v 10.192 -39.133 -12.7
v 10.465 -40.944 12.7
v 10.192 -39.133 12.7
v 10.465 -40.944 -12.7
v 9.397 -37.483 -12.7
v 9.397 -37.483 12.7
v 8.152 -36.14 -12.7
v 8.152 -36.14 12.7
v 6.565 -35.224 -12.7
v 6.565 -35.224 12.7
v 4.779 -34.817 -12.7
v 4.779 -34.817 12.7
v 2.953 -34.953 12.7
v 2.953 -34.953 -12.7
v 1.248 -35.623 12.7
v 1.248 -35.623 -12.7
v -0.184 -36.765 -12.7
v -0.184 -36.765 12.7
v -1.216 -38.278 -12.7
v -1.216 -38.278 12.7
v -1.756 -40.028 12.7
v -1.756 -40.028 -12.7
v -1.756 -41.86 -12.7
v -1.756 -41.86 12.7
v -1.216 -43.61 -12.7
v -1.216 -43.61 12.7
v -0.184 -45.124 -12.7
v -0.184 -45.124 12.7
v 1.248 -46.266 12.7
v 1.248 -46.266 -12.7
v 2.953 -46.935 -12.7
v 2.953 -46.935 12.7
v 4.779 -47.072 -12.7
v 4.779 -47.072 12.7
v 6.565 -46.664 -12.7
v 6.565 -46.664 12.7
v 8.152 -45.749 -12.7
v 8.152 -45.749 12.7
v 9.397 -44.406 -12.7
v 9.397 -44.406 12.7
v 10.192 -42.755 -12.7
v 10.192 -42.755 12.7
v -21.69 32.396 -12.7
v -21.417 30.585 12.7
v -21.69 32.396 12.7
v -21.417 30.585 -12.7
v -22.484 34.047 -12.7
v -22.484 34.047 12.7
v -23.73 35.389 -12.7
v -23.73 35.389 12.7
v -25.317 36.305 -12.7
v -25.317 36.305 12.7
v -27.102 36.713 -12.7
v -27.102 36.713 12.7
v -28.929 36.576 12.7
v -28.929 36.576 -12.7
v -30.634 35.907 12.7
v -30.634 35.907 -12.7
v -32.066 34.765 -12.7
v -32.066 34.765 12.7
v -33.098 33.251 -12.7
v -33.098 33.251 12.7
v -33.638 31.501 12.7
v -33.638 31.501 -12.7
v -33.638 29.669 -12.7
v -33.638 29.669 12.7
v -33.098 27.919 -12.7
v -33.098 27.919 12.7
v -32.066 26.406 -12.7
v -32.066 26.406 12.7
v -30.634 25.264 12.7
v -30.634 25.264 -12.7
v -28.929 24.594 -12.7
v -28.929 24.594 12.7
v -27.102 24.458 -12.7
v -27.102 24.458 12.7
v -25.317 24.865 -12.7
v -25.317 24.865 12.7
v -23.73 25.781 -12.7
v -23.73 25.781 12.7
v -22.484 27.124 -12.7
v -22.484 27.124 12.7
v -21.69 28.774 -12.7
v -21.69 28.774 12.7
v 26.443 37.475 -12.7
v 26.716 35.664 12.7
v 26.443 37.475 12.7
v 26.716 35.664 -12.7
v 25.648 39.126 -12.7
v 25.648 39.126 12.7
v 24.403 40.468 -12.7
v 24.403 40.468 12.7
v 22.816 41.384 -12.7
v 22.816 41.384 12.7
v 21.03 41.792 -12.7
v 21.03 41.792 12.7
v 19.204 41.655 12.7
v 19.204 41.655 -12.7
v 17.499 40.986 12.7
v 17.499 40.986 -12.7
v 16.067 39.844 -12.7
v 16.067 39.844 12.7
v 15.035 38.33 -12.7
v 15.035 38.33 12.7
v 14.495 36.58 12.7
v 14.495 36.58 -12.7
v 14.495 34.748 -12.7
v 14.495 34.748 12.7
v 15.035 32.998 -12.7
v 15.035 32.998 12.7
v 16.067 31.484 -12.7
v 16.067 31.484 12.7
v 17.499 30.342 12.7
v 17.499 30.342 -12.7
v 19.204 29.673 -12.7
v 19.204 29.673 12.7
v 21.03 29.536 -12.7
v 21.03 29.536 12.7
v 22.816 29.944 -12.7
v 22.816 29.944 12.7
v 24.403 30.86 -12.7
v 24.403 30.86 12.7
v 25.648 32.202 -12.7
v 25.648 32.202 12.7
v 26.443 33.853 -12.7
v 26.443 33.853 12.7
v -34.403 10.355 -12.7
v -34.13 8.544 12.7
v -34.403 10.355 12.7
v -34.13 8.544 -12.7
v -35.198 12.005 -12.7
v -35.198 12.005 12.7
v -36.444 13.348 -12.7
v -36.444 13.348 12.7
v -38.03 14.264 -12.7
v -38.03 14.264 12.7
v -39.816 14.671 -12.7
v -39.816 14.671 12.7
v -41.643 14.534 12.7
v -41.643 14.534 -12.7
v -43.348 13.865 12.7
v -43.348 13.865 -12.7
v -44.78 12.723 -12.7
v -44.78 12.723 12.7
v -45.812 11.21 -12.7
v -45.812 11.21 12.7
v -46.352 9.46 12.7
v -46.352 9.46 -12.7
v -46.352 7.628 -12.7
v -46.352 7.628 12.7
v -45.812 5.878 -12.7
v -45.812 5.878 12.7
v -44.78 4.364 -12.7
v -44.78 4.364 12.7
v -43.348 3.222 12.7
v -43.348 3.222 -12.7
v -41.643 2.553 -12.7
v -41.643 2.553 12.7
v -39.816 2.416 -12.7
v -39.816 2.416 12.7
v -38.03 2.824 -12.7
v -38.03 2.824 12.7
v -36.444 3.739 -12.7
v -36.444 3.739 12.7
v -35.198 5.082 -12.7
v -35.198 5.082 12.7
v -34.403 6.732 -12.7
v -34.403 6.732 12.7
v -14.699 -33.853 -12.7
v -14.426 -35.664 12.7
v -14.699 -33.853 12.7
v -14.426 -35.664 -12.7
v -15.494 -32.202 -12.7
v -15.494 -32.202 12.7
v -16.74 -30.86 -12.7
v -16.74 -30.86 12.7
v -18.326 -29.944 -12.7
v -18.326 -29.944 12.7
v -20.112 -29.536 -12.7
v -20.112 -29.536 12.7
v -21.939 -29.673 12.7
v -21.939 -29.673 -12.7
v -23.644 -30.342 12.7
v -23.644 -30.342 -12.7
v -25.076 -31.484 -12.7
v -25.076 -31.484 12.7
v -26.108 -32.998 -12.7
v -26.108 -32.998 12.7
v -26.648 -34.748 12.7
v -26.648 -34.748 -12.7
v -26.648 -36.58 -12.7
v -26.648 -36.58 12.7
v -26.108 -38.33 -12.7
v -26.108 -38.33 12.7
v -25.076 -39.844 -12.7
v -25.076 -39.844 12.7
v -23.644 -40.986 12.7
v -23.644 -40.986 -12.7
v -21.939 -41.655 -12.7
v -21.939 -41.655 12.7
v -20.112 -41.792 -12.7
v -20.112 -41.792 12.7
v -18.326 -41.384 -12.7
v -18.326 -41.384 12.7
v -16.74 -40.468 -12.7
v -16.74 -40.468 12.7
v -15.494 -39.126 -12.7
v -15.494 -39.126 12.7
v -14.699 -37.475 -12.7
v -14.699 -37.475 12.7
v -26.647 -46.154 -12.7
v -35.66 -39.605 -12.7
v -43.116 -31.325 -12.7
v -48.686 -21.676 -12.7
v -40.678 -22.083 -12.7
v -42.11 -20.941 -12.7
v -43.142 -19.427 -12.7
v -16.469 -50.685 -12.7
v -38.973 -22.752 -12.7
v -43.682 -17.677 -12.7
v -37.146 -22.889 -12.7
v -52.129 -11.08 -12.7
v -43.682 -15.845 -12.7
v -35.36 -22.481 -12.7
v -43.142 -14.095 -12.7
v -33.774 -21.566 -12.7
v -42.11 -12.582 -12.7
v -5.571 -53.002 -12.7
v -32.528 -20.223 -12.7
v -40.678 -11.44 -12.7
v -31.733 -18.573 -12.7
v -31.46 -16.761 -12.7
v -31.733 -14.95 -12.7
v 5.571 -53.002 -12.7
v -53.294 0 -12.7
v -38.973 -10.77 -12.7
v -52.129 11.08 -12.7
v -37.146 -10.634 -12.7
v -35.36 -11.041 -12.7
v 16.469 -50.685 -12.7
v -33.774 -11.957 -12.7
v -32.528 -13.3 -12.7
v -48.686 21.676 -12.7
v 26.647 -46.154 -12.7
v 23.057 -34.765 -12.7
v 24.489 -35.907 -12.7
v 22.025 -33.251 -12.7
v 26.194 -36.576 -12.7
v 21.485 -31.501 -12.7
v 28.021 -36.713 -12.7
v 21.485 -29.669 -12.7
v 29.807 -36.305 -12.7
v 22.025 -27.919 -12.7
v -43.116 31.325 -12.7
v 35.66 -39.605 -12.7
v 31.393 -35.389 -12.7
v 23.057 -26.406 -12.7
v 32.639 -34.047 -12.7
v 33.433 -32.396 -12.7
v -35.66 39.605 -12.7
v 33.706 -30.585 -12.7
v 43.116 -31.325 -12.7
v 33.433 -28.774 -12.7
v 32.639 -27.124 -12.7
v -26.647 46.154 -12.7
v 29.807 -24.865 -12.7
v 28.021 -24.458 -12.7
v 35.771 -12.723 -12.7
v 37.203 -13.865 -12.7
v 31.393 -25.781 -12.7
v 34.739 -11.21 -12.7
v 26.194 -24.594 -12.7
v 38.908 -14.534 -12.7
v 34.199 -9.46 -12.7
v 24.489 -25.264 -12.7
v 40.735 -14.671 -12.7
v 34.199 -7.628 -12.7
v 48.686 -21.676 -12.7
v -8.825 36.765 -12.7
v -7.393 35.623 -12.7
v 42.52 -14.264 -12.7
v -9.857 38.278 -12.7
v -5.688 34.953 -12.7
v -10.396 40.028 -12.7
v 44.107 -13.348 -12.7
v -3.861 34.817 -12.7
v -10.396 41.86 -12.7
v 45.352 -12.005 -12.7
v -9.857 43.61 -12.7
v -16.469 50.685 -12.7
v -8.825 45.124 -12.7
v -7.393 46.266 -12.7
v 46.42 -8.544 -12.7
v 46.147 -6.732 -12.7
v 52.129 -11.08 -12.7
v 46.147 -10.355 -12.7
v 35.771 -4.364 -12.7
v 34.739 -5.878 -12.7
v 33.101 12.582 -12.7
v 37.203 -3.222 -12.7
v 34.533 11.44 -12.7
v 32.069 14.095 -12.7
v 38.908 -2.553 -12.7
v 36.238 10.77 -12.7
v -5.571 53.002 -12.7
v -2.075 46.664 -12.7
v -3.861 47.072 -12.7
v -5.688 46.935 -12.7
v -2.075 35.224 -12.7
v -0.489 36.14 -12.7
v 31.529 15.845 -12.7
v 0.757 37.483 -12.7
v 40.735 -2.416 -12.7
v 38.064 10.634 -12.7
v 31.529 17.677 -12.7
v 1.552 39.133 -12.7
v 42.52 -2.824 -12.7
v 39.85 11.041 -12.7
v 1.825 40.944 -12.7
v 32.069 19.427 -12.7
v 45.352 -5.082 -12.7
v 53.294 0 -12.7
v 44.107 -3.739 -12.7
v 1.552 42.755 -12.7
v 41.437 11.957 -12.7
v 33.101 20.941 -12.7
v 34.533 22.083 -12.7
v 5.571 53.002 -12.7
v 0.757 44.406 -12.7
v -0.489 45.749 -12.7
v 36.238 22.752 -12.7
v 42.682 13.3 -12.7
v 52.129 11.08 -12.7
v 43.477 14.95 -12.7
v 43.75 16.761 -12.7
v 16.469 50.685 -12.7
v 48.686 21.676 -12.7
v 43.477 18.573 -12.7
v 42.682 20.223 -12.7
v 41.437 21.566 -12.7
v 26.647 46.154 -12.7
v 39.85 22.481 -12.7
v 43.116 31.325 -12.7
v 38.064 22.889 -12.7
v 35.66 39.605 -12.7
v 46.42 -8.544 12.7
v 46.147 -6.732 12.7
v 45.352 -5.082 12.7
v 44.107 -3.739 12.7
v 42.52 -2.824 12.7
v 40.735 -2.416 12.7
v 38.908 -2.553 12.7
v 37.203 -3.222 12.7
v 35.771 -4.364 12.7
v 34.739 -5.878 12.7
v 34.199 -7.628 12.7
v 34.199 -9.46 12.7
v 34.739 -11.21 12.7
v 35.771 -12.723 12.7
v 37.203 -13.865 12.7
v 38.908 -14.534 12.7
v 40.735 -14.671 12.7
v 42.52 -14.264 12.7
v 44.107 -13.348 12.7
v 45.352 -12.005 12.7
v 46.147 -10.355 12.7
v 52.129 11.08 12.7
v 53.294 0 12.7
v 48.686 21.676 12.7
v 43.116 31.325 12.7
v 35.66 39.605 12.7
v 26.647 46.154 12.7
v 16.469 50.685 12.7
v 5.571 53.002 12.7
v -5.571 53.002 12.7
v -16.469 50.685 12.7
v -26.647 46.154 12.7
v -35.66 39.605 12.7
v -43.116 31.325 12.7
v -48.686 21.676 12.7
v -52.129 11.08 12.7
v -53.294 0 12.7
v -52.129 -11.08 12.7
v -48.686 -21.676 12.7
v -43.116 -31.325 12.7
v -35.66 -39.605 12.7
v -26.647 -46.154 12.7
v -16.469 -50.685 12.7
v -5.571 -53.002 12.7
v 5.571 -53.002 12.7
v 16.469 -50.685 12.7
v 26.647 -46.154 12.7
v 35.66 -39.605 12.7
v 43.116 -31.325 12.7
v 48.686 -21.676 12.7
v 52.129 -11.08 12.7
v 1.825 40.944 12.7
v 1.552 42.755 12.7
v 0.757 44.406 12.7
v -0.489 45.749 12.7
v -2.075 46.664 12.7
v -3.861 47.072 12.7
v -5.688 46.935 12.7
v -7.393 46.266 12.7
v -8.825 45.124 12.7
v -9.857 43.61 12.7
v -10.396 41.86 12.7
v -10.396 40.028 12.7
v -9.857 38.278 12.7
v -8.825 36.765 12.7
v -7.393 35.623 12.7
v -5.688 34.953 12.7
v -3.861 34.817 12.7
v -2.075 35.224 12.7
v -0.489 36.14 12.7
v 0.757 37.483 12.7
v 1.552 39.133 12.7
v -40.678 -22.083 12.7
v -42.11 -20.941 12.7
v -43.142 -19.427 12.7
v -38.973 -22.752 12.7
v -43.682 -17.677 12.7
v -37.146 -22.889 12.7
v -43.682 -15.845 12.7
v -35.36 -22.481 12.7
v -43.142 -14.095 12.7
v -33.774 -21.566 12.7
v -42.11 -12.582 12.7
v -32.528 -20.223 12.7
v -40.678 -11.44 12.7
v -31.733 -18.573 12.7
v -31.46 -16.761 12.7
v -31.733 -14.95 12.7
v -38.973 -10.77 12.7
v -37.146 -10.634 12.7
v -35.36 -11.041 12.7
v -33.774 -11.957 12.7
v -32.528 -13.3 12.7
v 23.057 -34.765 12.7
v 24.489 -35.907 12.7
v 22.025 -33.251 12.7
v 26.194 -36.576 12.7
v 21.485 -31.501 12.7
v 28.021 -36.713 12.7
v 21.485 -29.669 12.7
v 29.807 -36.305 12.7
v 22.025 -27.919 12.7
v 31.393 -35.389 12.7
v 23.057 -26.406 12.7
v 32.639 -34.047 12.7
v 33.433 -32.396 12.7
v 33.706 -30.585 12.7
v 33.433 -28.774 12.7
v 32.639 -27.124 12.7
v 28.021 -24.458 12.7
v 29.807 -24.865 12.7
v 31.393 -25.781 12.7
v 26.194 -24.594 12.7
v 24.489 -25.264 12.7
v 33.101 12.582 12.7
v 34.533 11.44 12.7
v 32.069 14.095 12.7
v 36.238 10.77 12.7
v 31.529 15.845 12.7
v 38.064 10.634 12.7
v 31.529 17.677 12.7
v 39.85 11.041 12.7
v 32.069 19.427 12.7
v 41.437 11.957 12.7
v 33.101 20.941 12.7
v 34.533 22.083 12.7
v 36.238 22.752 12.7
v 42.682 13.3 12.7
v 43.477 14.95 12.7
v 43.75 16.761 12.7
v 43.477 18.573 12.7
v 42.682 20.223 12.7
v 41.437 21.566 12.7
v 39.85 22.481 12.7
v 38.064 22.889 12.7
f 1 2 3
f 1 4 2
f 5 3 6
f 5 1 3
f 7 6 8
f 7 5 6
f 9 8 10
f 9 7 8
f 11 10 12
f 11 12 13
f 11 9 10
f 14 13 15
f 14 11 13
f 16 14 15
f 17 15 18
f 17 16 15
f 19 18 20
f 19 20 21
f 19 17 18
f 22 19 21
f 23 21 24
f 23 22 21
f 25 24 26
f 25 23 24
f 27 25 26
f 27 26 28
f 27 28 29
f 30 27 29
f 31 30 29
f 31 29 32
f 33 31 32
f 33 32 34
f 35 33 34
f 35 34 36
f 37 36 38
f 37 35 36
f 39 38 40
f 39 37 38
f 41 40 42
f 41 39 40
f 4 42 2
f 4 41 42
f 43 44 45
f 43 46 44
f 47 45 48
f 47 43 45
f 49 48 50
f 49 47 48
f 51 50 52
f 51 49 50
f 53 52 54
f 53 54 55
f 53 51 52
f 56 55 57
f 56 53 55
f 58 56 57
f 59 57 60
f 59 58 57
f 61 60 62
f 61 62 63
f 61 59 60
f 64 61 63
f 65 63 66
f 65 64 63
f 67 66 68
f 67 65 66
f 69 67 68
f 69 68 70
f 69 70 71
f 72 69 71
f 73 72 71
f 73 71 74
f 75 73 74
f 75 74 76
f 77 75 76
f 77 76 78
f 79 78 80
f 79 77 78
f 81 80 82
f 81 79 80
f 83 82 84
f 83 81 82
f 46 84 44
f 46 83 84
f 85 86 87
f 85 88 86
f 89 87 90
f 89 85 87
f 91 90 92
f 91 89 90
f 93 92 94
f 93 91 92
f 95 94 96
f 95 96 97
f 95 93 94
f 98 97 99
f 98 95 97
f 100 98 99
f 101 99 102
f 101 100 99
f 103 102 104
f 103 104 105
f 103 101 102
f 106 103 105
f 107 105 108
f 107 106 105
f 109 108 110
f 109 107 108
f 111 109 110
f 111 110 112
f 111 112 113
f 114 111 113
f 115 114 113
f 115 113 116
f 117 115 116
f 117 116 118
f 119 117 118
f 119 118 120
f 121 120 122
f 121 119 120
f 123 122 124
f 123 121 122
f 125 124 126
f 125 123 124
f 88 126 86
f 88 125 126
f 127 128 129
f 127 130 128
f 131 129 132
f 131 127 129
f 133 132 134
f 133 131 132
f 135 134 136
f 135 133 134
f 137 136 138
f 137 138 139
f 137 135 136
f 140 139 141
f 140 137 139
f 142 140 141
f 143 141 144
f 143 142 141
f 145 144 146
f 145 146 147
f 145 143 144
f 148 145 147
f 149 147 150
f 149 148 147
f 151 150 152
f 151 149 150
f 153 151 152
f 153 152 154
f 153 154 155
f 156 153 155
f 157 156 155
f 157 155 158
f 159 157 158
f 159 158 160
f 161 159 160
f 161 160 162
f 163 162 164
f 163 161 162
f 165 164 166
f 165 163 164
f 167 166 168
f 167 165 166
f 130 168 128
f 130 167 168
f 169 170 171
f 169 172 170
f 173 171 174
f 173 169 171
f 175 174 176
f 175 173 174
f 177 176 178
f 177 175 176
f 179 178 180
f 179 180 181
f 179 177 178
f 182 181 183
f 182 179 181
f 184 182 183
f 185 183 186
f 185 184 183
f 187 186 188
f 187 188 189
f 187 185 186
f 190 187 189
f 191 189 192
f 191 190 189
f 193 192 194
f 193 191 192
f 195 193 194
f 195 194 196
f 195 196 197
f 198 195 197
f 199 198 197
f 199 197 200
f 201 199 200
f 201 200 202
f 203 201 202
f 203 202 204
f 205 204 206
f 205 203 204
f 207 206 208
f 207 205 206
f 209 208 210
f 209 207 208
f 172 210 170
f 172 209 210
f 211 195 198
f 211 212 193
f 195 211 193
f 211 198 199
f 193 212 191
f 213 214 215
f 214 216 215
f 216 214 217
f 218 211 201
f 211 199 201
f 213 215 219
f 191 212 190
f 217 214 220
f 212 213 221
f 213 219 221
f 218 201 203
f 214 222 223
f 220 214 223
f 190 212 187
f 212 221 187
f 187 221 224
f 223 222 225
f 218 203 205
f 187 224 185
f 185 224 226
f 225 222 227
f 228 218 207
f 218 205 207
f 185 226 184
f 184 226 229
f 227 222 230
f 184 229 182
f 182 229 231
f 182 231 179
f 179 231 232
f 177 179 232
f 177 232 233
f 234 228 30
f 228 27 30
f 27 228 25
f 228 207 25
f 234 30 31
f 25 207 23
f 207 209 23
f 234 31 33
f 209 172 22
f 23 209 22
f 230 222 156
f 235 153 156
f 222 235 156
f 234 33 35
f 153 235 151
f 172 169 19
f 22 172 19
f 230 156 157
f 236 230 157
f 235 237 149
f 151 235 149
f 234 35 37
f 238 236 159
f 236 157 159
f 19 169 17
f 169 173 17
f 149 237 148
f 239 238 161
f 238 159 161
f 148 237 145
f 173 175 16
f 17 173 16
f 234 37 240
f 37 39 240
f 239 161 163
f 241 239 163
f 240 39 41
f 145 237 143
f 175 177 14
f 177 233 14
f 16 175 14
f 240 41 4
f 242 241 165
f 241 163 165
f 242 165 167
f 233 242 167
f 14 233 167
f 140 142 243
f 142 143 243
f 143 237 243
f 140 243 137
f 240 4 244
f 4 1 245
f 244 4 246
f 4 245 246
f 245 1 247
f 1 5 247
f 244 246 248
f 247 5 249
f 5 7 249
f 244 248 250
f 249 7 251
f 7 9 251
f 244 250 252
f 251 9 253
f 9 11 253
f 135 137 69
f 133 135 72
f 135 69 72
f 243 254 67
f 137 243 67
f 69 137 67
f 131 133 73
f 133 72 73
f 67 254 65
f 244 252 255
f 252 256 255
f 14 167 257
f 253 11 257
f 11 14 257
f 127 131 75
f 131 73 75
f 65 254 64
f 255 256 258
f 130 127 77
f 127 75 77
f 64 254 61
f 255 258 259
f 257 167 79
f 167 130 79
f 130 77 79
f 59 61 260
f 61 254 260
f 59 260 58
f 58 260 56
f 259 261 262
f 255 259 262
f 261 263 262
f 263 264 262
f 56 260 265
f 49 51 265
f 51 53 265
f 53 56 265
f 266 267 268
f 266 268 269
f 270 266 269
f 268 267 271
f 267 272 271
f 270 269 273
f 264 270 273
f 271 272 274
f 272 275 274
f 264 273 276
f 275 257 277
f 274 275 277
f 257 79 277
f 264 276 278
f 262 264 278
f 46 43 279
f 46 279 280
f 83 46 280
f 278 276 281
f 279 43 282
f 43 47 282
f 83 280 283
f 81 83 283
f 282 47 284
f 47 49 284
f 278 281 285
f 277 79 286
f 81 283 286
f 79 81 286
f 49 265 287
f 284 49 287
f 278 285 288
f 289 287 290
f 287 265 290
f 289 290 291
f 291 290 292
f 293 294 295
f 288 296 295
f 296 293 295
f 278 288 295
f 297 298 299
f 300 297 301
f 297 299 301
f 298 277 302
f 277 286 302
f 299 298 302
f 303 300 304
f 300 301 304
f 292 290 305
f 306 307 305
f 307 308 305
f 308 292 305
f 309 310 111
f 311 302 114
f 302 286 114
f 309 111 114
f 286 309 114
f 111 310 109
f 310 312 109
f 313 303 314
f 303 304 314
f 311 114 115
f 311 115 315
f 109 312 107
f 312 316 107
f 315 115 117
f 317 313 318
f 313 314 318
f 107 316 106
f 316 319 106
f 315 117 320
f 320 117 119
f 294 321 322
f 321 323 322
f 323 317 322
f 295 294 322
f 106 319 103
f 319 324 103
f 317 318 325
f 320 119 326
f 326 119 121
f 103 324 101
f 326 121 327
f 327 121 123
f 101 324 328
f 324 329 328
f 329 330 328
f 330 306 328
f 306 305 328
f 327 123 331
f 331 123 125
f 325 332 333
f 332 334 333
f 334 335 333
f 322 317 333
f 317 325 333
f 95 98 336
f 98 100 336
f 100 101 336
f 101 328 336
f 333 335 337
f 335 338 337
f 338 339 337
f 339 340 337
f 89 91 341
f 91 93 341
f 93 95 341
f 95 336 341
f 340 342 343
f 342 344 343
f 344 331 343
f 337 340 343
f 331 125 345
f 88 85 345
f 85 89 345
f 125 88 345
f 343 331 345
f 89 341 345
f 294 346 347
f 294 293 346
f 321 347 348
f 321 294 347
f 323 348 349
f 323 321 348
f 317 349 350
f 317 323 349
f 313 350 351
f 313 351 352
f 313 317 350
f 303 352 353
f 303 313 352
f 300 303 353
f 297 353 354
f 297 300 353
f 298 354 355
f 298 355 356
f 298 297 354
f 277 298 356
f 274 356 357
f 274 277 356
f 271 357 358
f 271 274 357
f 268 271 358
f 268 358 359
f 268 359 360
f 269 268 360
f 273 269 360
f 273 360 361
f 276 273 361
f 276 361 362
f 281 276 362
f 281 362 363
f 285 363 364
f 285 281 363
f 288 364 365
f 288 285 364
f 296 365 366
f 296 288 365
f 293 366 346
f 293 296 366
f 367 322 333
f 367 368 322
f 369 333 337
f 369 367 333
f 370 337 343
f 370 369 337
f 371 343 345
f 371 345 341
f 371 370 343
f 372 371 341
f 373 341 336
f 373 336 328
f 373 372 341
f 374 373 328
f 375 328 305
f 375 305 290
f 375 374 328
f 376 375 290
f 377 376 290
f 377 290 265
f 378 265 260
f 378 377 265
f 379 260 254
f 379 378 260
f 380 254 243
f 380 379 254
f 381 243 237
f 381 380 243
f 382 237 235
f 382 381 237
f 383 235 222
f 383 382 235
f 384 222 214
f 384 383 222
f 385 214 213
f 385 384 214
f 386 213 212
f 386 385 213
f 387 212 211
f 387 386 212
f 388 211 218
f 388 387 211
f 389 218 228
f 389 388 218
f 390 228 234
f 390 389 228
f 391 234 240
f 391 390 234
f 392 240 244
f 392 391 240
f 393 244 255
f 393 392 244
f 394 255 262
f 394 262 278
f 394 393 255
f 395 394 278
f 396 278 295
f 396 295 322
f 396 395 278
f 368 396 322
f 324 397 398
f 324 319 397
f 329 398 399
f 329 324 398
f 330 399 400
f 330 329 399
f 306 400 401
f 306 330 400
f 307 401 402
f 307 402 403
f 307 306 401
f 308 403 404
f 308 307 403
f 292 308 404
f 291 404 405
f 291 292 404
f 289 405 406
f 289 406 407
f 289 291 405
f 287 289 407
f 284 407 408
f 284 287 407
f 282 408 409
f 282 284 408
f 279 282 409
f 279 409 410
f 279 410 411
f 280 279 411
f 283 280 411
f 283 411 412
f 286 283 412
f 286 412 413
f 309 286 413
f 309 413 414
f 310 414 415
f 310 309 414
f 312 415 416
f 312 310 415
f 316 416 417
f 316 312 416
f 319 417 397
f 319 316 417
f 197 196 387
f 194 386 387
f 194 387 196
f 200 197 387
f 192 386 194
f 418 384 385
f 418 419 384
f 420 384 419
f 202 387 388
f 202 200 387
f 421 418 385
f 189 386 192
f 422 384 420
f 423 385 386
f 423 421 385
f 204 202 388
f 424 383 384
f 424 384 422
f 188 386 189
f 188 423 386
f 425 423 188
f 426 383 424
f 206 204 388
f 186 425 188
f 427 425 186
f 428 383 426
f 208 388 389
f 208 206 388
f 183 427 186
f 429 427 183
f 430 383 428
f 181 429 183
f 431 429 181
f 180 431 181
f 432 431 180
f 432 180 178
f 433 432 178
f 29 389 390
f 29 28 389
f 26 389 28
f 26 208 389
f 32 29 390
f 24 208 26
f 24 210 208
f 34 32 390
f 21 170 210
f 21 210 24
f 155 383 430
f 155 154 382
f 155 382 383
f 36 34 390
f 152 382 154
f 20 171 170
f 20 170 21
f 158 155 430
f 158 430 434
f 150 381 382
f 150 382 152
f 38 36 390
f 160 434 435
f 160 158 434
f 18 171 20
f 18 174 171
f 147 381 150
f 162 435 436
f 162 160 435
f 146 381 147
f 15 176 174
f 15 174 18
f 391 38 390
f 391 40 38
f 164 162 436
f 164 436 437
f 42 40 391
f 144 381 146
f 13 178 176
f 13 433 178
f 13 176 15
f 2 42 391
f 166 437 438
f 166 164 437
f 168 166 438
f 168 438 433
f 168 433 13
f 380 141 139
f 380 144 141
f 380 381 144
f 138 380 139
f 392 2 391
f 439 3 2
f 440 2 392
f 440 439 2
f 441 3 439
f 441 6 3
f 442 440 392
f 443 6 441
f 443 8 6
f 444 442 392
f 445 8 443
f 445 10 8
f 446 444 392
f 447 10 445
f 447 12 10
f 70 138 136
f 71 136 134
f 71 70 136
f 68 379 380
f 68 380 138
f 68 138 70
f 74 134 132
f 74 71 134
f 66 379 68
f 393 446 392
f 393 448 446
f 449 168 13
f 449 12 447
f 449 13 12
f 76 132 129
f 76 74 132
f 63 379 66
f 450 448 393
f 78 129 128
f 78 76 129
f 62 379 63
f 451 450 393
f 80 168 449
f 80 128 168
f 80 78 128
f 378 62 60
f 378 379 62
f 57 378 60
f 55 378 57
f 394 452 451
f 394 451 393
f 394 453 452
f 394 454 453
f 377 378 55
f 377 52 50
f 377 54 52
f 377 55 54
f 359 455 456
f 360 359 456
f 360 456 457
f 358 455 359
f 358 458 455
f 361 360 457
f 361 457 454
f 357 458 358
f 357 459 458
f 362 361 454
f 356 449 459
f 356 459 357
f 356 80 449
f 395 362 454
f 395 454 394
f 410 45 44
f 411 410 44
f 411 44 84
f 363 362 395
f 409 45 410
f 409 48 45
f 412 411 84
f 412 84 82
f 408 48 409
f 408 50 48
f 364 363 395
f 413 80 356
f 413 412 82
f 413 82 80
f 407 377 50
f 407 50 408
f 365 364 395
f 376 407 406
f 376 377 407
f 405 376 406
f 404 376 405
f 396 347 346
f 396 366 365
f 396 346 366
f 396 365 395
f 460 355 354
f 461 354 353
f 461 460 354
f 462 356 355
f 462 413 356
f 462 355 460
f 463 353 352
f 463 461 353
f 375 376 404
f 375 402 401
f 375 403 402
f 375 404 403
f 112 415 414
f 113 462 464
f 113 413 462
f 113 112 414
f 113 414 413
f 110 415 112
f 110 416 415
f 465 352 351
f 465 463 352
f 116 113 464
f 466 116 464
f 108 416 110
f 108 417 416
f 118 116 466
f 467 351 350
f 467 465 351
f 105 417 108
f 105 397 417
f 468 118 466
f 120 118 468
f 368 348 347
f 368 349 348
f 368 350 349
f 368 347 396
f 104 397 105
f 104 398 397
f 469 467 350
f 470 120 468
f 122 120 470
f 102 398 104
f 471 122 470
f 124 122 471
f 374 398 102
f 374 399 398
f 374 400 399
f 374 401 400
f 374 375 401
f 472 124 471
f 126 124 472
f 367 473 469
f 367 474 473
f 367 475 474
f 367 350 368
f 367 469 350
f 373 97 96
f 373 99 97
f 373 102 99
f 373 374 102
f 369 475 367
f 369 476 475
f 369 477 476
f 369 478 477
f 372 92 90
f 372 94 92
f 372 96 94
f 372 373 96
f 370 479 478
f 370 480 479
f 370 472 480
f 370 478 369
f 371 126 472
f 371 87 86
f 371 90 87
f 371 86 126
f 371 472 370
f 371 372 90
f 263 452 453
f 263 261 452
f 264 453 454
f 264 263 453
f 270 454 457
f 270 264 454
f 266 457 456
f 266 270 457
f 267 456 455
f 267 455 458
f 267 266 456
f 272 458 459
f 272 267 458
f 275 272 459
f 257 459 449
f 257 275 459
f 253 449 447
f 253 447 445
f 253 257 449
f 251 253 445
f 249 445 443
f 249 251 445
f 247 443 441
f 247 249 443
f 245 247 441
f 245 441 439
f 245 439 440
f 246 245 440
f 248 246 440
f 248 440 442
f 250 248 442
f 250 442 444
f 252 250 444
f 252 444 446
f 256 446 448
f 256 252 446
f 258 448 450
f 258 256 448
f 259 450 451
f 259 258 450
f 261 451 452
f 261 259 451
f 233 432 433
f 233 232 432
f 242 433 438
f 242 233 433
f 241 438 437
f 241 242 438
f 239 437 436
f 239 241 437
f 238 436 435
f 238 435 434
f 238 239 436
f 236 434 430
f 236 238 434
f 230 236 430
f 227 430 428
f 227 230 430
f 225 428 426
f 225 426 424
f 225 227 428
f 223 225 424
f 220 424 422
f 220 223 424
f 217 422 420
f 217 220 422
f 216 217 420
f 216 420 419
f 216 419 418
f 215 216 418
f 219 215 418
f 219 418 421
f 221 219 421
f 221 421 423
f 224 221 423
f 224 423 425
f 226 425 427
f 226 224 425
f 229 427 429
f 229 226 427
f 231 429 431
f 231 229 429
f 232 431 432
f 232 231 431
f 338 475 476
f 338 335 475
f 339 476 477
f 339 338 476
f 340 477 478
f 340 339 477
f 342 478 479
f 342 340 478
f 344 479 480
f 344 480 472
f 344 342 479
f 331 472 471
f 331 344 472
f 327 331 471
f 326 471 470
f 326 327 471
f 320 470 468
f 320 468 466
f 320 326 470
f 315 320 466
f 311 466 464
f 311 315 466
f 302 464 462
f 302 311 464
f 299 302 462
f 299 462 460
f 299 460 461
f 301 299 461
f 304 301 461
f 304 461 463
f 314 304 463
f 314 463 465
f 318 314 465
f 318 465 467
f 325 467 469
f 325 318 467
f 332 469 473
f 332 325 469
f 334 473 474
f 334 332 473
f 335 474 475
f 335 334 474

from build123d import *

# Parameters (mm, degrees)
F0_R     = 53.2936931822
F0_R_2   = 6.1448817816
F1_DEPTH = 12.7


with BuildPart() as f1:
    # F0 (on Top) → F1 (new body, symmetric)
    with BuildSketch(Plane.XY):
        Circle(F0_R)
        with Locations((-20.5712730928, -35.6639767333)):
            Circle(F0_R_2, mode=Mode.SUBTRACT)
        with Locations((-37.6052690899, -16.7612723194)):
            Circle(F0_R_2, mode=Mode.SUBTRACT)
        with Locations((4.3202500339, -40.944254209)):
            Circle(F0_R_2, mode=Mode.SUBTRACT)
        with Locations((27.5615844876, -30.5852182209)):
            Circle(F0_R_2, mode=Mode.SUBTRACT)
        with Locations((40.2753304508, -8.5436684258)):
            Circle(F0_R_2, mode=Mode.SUBTRACT)
        with Locations((-40.2753304508, 8.5436684258)):
            Circle(F0_R_2, mode=Mode.SUBTRACT)
        with Locations((-27.5615844876, 30.5852182209)):
            Circle(F0_R_2, mode=Mode.SUBTRACT)
        with Locations((-4.3202500339, 40.944254209)):
            Circle(F0_R_2, mode=Mode.SUBTRACT)
        with Locations((37.6052690899, 16.7612723194)):
            Circle(F0_R_2, mode=Mode.SUBTRACT)
        with Locations((20.5712730928, 35.6639767333)):
            Circle(F0_R_2, mode=Mode.SUBTRACT)
    extrude(amount=F1_DEPTH, both=True)


solid = f1.part
